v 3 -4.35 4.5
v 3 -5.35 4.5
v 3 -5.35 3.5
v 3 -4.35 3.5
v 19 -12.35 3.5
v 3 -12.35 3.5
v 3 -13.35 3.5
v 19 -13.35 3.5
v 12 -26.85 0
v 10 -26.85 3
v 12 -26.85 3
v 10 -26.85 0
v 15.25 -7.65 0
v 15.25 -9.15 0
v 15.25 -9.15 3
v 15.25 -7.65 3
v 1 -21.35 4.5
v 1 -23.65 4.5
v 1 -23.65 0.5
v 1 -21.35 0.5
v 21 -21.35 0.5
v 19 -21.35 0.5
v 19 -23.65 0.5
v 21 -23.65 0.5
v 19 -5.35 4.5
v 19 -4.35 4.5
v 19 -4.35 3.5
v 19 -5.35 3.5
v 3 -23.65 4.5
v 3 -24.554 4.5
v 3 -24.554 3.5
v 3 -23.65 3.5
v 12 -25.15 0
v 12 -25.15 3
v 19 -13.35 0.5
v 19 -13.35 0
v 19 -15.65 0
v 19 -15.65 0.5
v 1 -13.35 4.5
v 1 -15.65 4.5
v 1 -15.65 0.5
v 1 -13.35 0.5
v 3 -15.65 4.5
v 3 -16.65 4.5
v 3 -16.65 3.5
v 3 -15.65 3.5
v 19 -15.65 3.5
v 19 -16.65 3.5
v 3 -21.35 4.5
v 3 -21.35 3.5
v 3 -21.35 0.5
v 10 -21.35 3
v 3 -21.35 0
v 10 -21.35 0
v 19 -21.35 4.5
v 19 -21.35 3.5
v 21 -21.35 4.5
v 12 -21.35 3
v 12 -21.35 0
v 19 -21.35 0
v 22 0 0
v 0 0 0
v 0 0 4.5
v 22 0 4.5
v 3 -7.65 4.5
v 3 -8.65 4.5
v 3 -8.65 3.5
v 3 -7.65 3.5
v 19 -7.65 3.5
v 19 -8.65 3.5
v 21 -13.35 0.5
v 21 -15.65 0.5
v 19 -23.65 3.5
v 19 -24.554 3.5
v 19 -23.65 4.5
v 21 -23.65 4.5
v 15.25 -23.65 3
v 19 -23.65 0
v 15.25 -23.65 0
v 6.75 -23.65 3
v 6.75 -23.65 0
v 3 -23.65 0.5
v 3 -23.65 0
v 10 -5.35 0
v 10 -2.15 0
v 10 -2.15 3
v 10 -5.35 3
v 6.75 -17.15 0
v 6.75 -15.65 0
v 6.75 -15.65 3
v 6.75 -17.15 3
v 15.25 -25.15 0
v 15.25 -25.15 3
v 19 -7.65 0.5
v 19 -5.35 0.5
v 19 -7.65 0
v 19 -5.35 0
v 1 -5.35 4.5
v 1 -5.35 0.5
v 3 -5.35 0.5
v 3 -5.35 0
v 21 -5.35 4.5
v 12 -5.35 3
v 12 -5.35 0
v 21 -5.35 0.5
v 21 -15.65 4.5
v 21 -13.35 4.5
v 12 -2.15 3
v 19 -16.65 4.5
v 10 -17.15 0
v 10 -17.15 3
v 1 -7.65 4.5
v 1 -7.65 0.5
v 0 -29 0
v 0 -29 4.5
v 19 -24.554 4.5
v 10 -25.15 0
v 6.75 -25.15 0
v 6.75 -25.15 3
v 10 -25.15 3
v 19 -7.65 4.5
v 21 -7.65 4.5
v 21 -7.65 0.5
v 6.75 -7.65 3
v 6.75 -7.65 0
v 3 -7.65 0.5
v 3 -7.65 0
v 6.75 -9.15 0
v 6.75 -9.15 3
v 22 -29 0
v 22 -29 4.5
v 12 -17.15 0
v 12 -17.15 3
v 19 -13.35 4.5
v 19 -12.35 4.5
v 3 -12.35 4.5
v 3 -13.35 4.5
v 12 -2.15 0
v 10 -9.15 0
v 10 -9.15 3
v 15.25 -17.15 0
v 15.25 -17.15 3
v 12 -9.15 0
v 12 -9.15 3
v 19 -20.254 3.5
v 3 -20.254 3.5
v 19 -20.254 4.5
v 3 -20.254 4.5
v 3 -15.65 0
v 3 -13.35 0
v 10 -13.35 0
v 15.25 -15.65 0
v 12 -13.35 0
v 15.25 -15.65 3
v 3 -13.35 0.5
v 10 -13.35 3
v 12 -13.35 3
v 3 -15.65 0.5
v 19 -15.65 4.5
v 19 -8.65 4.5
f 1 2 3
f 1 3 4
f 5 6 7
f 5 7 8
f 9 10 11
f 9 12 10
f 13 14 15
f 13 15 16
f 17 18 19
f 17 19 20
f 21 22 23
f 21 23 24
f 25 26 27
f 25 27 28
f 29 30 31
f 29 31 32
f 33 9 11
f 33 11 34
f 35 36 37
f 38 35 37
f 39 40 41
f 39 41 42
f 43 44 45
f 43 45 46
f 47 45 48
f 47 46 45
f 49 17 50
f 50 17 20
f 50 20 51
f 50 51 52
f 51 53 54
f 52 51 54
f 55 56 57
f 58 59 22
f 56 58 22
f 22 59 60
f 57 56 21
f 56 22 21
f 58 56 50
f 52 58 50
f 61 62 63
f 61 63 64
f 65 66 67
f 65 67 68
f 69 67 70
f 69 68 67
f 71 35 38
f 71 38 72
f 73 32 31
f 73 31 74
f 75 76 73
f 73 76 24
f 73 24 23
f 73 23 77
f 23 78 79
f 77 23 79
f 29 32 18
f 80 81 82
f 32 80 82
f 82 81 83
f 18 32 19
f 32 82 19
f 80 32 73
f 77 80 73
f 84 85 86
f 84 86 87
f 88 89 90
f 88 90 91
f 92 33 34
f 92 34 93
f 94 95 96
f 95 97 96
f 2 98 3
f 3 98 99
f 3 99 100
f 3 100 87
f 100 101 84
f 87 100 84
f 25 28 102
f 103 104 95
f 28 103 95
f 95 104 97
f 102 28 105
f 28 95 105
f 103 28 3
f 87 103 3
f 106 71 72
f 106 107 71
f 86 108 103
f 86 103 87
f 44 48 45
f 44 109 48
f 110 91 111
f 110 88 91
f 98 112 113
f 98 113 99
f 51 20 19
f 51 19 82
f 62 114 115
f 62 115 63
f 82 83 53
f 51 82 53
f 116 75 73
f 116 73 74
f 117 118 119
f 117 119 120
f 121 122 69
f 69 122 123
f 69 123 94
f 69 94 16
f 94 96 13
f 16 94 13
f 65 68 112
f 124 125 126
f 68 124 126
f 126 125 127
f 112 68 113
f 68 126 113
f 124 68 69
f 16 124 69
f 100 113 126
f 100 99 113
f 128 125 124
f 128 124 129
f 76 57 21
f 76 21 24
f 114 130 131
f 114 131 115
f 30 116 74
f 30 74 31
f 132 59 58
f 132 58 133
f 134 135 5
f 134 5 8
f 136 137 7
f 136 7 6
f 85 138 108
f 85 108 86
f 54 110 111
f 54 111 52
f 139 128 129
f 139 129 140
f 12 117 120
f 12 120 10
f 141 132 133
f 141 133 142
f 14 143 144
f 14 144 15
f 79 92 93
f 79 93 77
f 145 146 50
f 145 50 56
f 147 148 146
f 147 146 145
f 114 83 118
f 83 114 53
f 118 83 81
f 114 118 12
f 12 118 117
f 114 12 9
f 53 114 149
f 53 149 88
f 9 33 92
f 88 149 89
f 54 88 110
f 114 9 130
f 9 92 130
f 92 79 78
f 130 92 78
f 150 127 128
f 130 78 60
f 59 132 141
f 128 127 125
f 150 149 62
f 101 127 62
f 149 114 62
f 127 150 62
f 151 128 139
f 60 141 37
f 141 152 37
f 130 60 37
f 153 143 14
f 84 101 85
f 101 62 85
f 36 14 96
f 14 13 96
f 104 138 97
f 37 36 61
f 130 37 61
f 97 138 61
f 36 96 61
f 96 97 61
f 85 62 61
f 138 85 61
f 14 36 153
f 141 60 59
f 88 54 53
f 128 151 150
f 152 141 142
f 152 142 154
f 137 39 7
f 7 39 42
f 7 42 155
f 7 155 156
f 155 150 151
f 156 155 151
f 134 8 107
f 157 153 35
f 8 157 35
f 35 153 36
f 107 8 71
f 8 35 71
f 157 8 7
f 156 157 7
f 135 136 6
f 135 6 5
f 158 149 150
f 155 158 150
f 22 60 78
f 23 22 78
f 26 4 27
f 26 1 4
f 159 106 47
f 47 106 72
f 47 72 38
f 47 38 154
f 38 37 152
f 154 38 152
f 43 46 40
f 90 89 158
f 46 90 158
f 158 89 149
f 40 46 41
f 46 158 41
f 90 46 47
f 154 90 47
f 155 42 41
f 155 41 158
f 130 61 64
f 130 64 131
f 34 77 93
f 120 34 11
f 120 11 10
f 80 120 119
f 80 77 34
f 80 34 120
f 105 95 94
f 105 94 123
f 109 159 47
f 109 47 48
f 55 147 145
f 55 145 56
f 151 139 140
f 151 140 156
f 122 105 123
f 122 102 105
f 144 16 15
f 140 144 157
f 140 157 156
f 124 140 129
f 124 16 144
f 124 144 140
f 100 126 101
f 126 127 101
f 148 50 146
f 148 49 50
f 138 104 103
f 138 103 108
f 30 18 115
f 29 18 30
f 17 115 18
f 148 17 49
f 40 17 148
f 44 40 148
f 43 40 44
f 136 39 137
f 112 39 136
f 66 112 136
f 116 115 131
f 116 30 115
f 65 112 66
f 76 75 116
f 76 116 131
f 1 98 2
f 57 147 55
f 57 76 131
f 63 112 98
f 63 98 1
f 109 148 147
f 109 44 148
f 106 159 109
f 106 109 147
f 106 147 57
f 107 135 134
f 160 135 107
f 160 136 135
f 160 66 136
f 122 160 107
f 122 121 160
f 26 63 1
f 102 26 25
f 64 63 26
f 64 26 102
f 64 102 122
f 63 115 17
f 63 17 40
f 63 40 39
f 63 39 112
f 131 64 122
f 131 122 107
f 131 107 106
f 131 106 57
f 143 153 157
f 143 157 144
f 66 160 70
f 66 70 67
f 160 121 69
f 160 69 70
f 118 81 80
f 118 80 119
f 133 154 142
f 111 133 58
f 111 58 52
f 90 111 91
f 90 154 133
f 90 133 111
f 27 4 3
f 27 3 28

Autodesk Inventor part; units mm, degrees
ref_plane "YZ Plane" through (0, 0, 0) normal (1, 0, 0) x (0, 1, 0)
ref_plane "XZ Plane" through (0, 0, 0) normal (0, 1, 0) x (-1, 0, 0)
ref_plane "XY Plane" through (0, 0, 0) normal (0, 0, 1) x (1, 0, 0)
sketch "Sketch1" plane through (0, 0, 0) normal (0, 0, 1) x (1, 0, 0)
  line L0 (0, 0) -> (22, 0)
  line L1 (22, 0) -> (22, -29)
  line L2 (22, -29) -> (0, -29)
  line L3 (0, -29) -> (0, 0)
  line L4 (3, -5.35) -> (19, -5.35)
  line L5 (19, -5.35) -> (19, -7.65)
  line L6 (19, -7.65) -> (3, -7.65)
  line L7 (3, -7.65) -> (3, -5.35)
  line L8 (3, -13.35) -> (19, -13.35)
  line L9 (19, -13.35) -> (19, -15.65)
  line L10 (19, -15.65) -> (3, -15.65)
  line L11 (3, -15.65) -> (3, -13.35)
  line L12 (3, -21.35) -> (19, -21.35)
  line L13 (19, -21.35) -> (19, -23.65)
  line L14 (19, -23.65) -> (3, -23.65)
  line L15 (3, -23.65) -> (3, -21.35)
  line L16 (19, -5.35) -> (19, -13.35) construction
  line L17 (19, -13.35) -> (19, -21.35) construction
  line L18 (22, -14.5) -> (0, -14.5) construction
  line L19 (11, 0) -> (11, -29) construction
  point P0 (19, -14.5)
  point P1 (11, -5.35)
  dimension "d0" = 22
  dimension "d1" = 29
  dimension "d2" = 2.3
  dimension "d3" = 8
  dimension "d4" = 16
extrude "Body with light pipe slots" add sketch "Sketch1" along normal blind 4.5
sketch "Sketch2" plane through (0, 0, 4.5) normal (0, 0, 1) x (1, 0, 0)
  line L0 (0, -29) -> (22, -29) construction
  line L1 (22, -29) -> (22, 0) construction
  line L2 (22, 0) -> (0, 0) construction
  line L3 (0, 0) -> (0, -29) construction
  line L4 (3, -21.35) -> (19, -21.35) construction
  line L5 (19, -21.35) -> (19, -23.65) construction
  line L6 (19, -23.65) -> (3, -23.65) construction
  line L7 (3, -23.65) -> (3, -21.35) construction
  line L8 (3, -13.35) -> (19, -13.35) construction
  line L9 (19, -13.35) -> (19, -15.65) construction
  line L10 (19, -15.65) -> (3, -15.65) construction
  line L11 (3, -15.65) -> (3, -13.35) construction
  line L12 (3, -5.35) -> (19, -5.35) construction
  line L13 (19, -5.35) -> (19, -7.65) construction
  line L14 (19, -7.65) -> (3, -7.65) construction
  line L15 (3, -7.65) -> (3, -5.35) construction
  line L16 (1, -5.35) -> (21, -5.35)
  line L17 (21, -5.35) -> (21, -7.65)
  line L18 (21, -7.65) -> (1, -7.65)
  line L19 (1, -7.65) -> (1, -5.35)
  line L20 (1, -13.35) -> (21, -13.35)
  line L21 (21, -13.35) -> (21, -15.65)
  line L22 (21, -15.65) -> (1, -15.65)
  line L23 (1, -15.65) -> (1, -13.35)
  line L24 (1, -21.35) -> (21, -21.35)
  line L25 (21, -21.35) -> (21, -23.65)
  line L26 (21, -23.65) -> (1, -23.65)
  line L27 (1, -23.65) -> (1, -21.35)
  dimension "d7" = 2
  dimension "d8" = 2
extrude "Light pipe wing cuts" cut sketch "Sketch2" against normal blind 4
sketch "Sketch3" plane through (0, 0, 4.5) normal (0, 0, 1) x (1, 0, 0)
  line L0 (1, -21.35) -> (21, -21.35) construction
  line L1 (21, -21.35) -> (21, -23.65) construction
  line L2 (21, -23.65) -> (1, -23.65) construction
  line L3 (1, -23.65) -> (1, -21.35) construction
  line L4 (1, -13.35) -> (21, -13.35) construction
  line L5 (21, -13.35) -> (21, -15.65) construction
  line L6 (21, -15.65) -> (1, -15.65) construction
  line L7 (1, -15.65) -> (1, -13.35) construction
  line L8 (1, -5.35) -> (21, -5.35) construction
  line L9 (21, -5.35) -> (21, -7.65) construction
  line L10 (21, -7.65) -> (1, -7.65) construction
  line L11 (1, -7.65) -> (1, -5.35) construction
  line L12 (0, -29) -> (22, -29) construction
  line L13 (22, -29) -> (22, 0) construction
  line L14 (22, 0) -> (0, 0) construction
  line L15 (0, 0) -> (0, -29) construction
  line L16 (3, -5.35) -> (3, -7.65) construction
  line L17 (19, -7.65) -> (19, -5.35) construction
  line L18 (19, -15.65) -> (19, -13.35) construction
  line L19 (19, -23.65) -> (19, -21.35) construction
  line L20 (3, -21.35) -> (3, -23.65) construction
  line L21 (3, -13.35) -> (3, -15.65) construction
  line L22 (3, -4.35) -> (19, -4.35)
  line L23 (19, -4.35) -> (19, -8.65)
  line L24 (19, -8.65) -> (3, -8.65)
  line L25 (3, -8.65) -> (3, -4.35)
  line L26 (3, -12.35) -> (19, -12.35)
  line L27 (19, -12.35) -> (19, -16.65)
  line L28 (19, -16.65) -> (3, -16.65)
  line L29 (3, -16.65) -> (3, -12.35)
  line L30 (3, -20.2545) -> (19, -20.2545)
  line L31 (19, -20.2545) -> (19, -24.5545)
  line L32 (19, -24.5545) -> (3, -24.5545)
  line L33 (3, -24.5545) -> (3, -20.2545)
  dimension "d11" = 1
  dimension "d12" = 1
  dimension "d13" = 1.0956
  dimension "d14" = 1
extrude "SMD clearance cuts" cut sketch "Sketch3" against normal blind 1
sketch "Sketch4" plane through (0, 0, 0) normal (0, 0, -1) x (-1, 0, 0)
  line L0 (-22, 0) -> (0, 0) construction
  line L1 (-11, 0) -> (-11, -29) construction
  line L2 (0, -29) -> (-22, -29) construction
  line L3 (-12, -2.15) -> (-10, -2.15)
  line L4 (-10, -26.85) -> (-12, -26.85)
  line L5 (-3, -5.35) -> (-19, -5.35) projected
  line L6 (-19, -23.65) -> (-3, -23.65) projected
  line L7 (-6.75, -23.65) -> (-6.75, -25.15)
  line L8 (-15.25, -25.15) -> (-15.25, -23.65)
  line L9 (-19, -15.65) -> (-3, -15.65) projected
  line L10 (-6.75, -15.65) -> (-6.75, -17.15)
  line L11 (-15.25, -17.15) -> (-15.25, -15.65)
  line L12 (-3, -7.65) -> (-19, -7.65) projected
  line L13 (-6.75, -7.65) -> (-6.75, -9.15)
  line L14 (-15.25, -9.15) -> (-15.25, -7.65)
  line L15 (-12, -7.65) -> (-12, -2.15)
  line L16 (-10, -2.15) -> (-10, -7.65)
  line L17 (-6.75, -9.15) -> (-10, -9.15)
  line L18 (-12, -9.15) -> (-15.25, -9.15)
  line L19 (-12, -15.65) -> (-12, -9.15)
  line L20 (-10, -9.15) -> (-10, -15.65)
  line L21 (-15.25, -15.65) -> (-12, -15.65)
  line L22 (-10, -15.65) -> (-6.75, -15.65)
  line L23 (-6.75, -17.15) -> (-10, -17.15)
  line L24 (-12, -17.15) -> (-15.25, -17.15)
  line L25 (-15.25, -23.65) -> (-12, -23.65)
  line L26 (-10, -23.65) -> (-6.75, -23.65)
  line L27 (-6.75, -25.15) -> (-10, -25.15)
  line L28 (-12, -25.15) -> (-15.25, -25.15)
  line L29 (-12, -26.85) -> (-12, -25.15)
  line L30 (-12, -23.65) -> (-12, -17.15)
  line L31 (-10, -17.15) -> (-10, -23.65)
  line L32 (-10, -25.15) -> (-10, -26.85)
  line L33 (-15.25, -7.65) -> (-12, -7.65)
  line L34 (-10, -7.65) -> (-6.75, -7.65)
  point P0 (-11, -2.15)
  dimension "d17" = 3.2
  dimension "d18" = 2
  dimension "d19" = 3.2
  dimension "d20" = 1.5
  dimension "d21" = 8.5
  dimension "d22" = 4.25
extrude "Case interior molding cuts" cut sketch "Sketch4" against normal blind 3
equation "\"d8\" = d7"
equation "\"d12\" = d11"
equation "\"d14\" = d11"
equation "\"d22\" = 0.5 * d21"
properties part number "Lightpipe shield"
